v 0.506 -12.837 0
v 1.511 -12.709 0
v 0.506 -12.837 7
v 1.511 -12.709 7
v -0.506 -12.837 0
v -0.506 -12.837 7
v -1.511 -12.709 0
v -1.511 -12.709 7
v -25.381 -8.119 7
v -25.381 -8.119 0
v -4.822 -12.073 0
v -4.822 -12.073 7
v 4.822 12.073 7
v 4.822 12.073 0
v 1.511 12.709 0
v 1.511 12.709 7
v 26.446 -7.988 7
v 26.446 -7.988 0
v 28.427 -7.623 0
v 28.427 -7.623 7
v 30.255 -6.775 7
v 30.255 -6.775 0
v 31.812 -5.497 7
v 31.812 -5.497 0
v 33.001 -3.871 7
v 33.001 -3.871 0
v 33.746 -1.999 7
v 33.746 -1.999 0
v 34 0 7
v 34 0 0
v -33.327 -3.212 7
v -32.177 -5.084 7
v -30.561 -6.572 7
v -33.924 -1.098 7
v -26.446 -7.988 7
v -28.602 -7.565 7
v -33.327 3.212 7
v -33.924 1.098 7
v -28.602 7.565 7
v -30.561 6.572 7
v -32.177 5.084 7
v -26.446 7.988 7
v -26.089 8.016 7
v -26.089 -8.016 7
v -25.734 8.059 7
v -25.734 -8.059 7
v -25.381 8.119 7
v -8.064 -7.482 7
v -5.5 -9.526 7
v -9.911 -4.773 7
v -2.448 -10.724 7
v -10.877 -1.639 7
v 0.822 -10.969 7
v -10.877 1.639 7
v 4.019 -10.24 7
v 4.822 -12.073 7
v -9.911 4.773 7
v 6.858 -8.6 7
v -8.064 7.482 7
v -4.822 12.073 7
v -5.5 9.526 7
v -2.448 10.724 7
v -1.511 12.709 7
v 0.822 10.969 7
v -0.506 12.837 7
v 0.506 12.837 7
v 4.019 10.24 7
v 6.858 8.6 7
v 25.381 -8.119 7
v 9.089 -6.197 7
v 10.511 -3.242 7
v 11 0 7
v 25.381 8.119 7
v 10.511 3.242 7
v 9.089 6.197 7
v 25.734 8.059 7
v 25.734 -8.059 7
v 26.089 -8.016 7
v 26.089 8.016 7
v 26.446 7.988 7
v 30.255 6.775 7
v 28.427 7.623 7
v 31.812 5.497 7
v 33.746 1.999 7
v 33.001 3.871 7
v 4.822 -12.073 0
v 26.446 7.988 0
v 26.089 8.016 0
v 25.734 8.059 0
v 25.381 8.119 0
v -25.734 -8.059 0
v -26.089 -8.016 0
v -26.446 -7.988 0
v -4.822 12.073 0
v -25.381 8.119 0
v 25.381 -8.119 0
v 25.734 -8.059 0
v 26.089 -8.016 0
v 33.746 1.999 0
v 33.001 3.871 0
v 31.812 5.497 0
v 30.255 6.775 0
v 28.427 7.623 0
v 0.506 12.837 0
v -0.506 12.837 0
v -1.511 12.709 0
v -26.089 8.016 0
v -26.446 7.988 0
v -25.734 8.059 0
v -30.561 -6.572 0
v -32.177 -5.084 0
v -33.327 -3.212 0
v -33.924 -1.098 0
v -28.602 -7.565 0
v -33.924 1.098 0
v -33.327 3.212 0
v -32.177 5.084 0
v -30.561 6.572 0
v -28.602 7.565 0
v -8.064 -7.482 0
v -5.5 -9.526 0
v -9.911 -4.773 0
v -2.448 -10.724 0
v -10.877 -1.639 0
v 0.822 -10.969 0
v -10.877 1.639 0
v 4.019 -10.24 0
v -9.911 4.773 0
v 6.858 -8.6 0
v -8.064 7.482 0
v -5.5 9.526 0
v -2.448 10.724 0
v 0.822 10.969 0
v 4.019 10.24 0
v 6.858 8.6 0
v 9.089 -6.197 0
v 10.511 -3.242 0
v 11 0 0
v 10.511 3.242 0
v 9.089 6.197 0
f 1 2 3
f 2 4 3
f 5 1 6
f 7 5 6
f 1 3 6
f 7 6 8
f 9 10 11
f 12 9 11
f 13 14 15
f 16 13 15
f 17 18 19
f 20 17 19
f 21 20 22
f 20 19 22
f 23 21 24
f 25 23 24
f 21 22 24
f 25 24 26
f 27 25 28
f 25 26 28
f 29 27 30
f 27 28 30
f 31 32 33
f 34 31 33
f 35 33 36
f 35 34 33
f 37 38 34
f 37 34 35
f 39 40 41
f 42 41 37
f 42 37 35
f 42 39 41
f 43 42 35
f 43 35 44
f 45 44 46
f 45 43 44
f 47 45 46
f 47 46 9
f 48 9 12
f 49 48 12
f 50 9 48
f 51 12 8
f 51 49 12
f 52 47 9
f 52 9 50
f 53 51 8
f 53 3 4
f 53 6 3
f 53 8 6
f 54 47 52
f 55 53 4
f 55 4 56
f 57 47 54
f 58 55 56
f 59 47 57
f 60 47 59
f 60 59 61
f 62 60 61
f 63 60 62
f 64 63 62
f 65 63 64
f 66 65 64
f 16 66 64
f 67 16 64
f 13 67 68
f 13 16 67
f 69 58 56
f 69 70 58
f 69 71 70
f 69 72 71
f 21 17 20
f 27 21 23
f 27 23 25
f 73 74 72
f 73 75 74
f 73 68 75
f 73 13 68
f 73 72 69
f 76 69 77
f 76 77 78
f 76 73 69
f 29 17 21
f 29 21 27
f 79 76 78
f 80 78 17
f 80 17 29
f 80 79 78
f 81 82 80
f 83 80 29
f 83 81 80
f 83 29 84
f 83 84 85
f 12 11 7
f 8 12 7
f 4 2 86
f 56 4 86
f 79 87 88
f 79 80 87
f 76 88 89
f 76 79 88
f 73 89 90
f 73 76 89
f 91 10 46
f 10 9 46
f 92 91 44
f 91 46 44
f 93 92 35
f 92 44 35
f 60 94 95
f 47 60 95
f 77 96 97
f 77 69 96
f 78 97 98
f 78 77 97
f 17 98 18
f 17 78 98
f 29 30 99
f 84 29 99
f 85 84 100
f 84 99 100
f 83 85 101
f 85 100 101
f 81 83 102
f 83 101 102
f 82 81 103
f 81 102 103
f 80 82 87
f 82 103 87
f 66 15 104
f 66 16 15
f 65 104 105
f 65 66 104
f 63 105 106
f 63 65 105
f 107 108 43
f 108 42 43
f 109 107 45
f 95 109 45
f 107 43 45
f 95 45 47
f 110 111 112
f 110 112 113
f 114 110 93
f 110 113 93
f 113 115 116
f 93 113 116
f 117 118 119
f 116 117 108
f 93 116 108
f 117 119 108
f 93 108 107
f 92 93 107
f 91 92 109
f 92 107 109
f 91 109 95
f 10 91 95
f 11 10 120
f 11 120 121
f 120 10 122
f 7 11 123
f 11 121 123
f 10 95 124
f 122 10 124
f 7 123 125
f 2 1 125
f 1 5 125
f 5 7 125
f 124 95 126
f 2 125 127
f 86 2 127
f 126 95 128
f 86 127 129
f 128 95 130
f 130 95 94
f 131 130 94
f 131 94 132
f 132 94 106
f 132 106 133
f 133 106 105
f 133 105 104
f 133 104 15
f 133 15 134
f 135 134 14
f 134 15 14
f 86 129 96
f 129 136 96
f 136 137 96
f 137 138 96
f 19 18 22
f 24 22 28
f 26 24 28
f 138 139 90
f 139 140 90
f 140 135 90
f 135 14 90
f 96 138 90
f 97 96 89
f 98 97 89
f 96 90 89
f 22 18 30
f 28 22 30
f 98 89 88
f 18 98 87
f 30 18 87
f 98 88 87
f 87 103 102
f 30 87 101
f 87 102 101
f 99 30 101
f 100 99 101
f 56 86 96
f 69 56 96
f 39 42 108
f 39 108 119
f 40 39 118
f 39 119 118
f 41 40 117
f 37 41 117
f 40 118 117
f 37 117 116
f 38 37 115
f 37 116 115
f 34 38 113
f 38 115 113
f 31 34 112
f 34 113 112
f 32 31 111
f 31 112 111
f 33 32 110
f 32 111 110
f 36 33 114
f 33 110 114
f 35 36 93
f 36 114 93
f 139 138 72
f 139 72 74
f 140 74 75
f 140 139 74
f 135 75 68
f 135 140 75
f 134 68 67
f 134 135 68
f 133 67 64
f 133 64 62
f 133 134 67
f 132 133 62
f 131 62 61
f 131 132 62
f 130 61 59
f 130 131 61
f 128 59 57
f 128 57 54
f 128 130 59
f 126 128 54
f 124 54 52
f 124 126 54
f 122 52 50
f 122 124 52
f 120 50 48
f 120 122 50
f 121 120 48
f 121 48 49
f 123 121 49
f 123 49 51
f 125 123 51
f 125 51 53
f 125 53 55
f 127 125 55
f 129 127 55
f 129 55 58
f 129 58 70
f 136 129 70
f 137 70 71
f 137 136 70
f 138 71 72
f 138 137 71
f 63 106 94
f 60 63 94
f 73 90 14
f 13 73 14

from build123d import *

# Parameters (mm, degrees)
F0_R     = 11
F1_DEPTH = 7
F2_R     = 8
F3_R     = 8


with BuildPart() as f1:
    # F0 (on Top) → F1 (new body)
    with BuildSketch(Plane.XY):
        with BuildLine():
            ThreePointArc((4.8216833096, -12.0727532097), (10.7629429763, -7.2910258872), (13, 0))
            ThreePointArc((13, 0), (10.7629429763, 7.2910258872), (4.8216833096, 12.0727532097))
            Line((4.8216833096, 12.0727532097), (0, 13))
            Line((0, 13), (-4.8216833096, 12.0727532097))
            ThreePointArc((-4.8216833096, 12.0727532097), (-13, 0), (-4.8216833096, -12.0727532097))
            Line((-4.8216833096, -12.0727532097), (0, -13))
            Line((0, -13), (4.8216833096, -12.0727532097))
        make_face()
        Circle(F0_R, mode=Mode.SUBTRACT)
        with BuildLine():
            ThreePointArc((4.8216833096, 12.0727532097), (10.7629429763, 7.2910258872), (13, 0))
            ThreePointArc((13, 0), (10.7629429763, -7.2910258872), (4.8216833096, -12.0727532097))
            Line((4.8216833096, -12.0727532097), (26, -8))
            ThreePointArc((26, -8), (18, 0), (26, 8))
            Line((26, 8), (4.8216833096, 12.0727532097))
        make_face()
        with BuildLine():
            ThreePointArc((34, 0), (31.6568542495, 5.6568542495), (26, 8))
            ThreePointArc((26, 8), (18, 0), (26, -8))
            ThreePointArc((26, -8), (31.6568542495, -5.6568542495), (34, 0))
        make_face()
        with BuildLine():
            ThreePointArc((-4.8216833096, -12.0727532097), (-13, 0), (-4.8216833096, 12.0727532097))
            Line((-4.8216833096, 12.0727532097), (-26, 8))
            ThreePointArc((-26, 8), (-20.3431457505, 5.6568542495), (-18, 0))
            ThreePointArc((-18, 0), (-20.3431457505, -5.6568542495), (-26, -8))
            Line((-26, -8), (-4.8216833096, -12.0727532097))
        make_face()
        with BuildLine():
            ThreePointArc((-18, 0), (-20.3431457505, 5.6568542495), (-26, 8))
            ThreePointArc((-26, 8), (-34, 0), (-26, -8))
            ThreePointArc((-26, -8), (-20.3431457505, -5.6568542495), (-18, 0))
        make_face()
    extrude(amount=F1_DEPTH)

    # F2
    f2_edges = [f1.edges().sort_by_distance(p)[0] for p in [
        (0, -13, 3.5),
        (0, 13, 3.5),
    ]]
    fillet(f2_edges, radius=F2_R)

    # F3
    f3_edges = [f1.edges().sort_by_distance(p)[0] for p in [
        (-26, -8, 3.5),
        (-26, 8, 3.5),
        (26, 8, 3.5),
        (26, -8, 3.5),
    ]]
    fillet(f3_edges, radius=F3_R)


solid = f1.part
